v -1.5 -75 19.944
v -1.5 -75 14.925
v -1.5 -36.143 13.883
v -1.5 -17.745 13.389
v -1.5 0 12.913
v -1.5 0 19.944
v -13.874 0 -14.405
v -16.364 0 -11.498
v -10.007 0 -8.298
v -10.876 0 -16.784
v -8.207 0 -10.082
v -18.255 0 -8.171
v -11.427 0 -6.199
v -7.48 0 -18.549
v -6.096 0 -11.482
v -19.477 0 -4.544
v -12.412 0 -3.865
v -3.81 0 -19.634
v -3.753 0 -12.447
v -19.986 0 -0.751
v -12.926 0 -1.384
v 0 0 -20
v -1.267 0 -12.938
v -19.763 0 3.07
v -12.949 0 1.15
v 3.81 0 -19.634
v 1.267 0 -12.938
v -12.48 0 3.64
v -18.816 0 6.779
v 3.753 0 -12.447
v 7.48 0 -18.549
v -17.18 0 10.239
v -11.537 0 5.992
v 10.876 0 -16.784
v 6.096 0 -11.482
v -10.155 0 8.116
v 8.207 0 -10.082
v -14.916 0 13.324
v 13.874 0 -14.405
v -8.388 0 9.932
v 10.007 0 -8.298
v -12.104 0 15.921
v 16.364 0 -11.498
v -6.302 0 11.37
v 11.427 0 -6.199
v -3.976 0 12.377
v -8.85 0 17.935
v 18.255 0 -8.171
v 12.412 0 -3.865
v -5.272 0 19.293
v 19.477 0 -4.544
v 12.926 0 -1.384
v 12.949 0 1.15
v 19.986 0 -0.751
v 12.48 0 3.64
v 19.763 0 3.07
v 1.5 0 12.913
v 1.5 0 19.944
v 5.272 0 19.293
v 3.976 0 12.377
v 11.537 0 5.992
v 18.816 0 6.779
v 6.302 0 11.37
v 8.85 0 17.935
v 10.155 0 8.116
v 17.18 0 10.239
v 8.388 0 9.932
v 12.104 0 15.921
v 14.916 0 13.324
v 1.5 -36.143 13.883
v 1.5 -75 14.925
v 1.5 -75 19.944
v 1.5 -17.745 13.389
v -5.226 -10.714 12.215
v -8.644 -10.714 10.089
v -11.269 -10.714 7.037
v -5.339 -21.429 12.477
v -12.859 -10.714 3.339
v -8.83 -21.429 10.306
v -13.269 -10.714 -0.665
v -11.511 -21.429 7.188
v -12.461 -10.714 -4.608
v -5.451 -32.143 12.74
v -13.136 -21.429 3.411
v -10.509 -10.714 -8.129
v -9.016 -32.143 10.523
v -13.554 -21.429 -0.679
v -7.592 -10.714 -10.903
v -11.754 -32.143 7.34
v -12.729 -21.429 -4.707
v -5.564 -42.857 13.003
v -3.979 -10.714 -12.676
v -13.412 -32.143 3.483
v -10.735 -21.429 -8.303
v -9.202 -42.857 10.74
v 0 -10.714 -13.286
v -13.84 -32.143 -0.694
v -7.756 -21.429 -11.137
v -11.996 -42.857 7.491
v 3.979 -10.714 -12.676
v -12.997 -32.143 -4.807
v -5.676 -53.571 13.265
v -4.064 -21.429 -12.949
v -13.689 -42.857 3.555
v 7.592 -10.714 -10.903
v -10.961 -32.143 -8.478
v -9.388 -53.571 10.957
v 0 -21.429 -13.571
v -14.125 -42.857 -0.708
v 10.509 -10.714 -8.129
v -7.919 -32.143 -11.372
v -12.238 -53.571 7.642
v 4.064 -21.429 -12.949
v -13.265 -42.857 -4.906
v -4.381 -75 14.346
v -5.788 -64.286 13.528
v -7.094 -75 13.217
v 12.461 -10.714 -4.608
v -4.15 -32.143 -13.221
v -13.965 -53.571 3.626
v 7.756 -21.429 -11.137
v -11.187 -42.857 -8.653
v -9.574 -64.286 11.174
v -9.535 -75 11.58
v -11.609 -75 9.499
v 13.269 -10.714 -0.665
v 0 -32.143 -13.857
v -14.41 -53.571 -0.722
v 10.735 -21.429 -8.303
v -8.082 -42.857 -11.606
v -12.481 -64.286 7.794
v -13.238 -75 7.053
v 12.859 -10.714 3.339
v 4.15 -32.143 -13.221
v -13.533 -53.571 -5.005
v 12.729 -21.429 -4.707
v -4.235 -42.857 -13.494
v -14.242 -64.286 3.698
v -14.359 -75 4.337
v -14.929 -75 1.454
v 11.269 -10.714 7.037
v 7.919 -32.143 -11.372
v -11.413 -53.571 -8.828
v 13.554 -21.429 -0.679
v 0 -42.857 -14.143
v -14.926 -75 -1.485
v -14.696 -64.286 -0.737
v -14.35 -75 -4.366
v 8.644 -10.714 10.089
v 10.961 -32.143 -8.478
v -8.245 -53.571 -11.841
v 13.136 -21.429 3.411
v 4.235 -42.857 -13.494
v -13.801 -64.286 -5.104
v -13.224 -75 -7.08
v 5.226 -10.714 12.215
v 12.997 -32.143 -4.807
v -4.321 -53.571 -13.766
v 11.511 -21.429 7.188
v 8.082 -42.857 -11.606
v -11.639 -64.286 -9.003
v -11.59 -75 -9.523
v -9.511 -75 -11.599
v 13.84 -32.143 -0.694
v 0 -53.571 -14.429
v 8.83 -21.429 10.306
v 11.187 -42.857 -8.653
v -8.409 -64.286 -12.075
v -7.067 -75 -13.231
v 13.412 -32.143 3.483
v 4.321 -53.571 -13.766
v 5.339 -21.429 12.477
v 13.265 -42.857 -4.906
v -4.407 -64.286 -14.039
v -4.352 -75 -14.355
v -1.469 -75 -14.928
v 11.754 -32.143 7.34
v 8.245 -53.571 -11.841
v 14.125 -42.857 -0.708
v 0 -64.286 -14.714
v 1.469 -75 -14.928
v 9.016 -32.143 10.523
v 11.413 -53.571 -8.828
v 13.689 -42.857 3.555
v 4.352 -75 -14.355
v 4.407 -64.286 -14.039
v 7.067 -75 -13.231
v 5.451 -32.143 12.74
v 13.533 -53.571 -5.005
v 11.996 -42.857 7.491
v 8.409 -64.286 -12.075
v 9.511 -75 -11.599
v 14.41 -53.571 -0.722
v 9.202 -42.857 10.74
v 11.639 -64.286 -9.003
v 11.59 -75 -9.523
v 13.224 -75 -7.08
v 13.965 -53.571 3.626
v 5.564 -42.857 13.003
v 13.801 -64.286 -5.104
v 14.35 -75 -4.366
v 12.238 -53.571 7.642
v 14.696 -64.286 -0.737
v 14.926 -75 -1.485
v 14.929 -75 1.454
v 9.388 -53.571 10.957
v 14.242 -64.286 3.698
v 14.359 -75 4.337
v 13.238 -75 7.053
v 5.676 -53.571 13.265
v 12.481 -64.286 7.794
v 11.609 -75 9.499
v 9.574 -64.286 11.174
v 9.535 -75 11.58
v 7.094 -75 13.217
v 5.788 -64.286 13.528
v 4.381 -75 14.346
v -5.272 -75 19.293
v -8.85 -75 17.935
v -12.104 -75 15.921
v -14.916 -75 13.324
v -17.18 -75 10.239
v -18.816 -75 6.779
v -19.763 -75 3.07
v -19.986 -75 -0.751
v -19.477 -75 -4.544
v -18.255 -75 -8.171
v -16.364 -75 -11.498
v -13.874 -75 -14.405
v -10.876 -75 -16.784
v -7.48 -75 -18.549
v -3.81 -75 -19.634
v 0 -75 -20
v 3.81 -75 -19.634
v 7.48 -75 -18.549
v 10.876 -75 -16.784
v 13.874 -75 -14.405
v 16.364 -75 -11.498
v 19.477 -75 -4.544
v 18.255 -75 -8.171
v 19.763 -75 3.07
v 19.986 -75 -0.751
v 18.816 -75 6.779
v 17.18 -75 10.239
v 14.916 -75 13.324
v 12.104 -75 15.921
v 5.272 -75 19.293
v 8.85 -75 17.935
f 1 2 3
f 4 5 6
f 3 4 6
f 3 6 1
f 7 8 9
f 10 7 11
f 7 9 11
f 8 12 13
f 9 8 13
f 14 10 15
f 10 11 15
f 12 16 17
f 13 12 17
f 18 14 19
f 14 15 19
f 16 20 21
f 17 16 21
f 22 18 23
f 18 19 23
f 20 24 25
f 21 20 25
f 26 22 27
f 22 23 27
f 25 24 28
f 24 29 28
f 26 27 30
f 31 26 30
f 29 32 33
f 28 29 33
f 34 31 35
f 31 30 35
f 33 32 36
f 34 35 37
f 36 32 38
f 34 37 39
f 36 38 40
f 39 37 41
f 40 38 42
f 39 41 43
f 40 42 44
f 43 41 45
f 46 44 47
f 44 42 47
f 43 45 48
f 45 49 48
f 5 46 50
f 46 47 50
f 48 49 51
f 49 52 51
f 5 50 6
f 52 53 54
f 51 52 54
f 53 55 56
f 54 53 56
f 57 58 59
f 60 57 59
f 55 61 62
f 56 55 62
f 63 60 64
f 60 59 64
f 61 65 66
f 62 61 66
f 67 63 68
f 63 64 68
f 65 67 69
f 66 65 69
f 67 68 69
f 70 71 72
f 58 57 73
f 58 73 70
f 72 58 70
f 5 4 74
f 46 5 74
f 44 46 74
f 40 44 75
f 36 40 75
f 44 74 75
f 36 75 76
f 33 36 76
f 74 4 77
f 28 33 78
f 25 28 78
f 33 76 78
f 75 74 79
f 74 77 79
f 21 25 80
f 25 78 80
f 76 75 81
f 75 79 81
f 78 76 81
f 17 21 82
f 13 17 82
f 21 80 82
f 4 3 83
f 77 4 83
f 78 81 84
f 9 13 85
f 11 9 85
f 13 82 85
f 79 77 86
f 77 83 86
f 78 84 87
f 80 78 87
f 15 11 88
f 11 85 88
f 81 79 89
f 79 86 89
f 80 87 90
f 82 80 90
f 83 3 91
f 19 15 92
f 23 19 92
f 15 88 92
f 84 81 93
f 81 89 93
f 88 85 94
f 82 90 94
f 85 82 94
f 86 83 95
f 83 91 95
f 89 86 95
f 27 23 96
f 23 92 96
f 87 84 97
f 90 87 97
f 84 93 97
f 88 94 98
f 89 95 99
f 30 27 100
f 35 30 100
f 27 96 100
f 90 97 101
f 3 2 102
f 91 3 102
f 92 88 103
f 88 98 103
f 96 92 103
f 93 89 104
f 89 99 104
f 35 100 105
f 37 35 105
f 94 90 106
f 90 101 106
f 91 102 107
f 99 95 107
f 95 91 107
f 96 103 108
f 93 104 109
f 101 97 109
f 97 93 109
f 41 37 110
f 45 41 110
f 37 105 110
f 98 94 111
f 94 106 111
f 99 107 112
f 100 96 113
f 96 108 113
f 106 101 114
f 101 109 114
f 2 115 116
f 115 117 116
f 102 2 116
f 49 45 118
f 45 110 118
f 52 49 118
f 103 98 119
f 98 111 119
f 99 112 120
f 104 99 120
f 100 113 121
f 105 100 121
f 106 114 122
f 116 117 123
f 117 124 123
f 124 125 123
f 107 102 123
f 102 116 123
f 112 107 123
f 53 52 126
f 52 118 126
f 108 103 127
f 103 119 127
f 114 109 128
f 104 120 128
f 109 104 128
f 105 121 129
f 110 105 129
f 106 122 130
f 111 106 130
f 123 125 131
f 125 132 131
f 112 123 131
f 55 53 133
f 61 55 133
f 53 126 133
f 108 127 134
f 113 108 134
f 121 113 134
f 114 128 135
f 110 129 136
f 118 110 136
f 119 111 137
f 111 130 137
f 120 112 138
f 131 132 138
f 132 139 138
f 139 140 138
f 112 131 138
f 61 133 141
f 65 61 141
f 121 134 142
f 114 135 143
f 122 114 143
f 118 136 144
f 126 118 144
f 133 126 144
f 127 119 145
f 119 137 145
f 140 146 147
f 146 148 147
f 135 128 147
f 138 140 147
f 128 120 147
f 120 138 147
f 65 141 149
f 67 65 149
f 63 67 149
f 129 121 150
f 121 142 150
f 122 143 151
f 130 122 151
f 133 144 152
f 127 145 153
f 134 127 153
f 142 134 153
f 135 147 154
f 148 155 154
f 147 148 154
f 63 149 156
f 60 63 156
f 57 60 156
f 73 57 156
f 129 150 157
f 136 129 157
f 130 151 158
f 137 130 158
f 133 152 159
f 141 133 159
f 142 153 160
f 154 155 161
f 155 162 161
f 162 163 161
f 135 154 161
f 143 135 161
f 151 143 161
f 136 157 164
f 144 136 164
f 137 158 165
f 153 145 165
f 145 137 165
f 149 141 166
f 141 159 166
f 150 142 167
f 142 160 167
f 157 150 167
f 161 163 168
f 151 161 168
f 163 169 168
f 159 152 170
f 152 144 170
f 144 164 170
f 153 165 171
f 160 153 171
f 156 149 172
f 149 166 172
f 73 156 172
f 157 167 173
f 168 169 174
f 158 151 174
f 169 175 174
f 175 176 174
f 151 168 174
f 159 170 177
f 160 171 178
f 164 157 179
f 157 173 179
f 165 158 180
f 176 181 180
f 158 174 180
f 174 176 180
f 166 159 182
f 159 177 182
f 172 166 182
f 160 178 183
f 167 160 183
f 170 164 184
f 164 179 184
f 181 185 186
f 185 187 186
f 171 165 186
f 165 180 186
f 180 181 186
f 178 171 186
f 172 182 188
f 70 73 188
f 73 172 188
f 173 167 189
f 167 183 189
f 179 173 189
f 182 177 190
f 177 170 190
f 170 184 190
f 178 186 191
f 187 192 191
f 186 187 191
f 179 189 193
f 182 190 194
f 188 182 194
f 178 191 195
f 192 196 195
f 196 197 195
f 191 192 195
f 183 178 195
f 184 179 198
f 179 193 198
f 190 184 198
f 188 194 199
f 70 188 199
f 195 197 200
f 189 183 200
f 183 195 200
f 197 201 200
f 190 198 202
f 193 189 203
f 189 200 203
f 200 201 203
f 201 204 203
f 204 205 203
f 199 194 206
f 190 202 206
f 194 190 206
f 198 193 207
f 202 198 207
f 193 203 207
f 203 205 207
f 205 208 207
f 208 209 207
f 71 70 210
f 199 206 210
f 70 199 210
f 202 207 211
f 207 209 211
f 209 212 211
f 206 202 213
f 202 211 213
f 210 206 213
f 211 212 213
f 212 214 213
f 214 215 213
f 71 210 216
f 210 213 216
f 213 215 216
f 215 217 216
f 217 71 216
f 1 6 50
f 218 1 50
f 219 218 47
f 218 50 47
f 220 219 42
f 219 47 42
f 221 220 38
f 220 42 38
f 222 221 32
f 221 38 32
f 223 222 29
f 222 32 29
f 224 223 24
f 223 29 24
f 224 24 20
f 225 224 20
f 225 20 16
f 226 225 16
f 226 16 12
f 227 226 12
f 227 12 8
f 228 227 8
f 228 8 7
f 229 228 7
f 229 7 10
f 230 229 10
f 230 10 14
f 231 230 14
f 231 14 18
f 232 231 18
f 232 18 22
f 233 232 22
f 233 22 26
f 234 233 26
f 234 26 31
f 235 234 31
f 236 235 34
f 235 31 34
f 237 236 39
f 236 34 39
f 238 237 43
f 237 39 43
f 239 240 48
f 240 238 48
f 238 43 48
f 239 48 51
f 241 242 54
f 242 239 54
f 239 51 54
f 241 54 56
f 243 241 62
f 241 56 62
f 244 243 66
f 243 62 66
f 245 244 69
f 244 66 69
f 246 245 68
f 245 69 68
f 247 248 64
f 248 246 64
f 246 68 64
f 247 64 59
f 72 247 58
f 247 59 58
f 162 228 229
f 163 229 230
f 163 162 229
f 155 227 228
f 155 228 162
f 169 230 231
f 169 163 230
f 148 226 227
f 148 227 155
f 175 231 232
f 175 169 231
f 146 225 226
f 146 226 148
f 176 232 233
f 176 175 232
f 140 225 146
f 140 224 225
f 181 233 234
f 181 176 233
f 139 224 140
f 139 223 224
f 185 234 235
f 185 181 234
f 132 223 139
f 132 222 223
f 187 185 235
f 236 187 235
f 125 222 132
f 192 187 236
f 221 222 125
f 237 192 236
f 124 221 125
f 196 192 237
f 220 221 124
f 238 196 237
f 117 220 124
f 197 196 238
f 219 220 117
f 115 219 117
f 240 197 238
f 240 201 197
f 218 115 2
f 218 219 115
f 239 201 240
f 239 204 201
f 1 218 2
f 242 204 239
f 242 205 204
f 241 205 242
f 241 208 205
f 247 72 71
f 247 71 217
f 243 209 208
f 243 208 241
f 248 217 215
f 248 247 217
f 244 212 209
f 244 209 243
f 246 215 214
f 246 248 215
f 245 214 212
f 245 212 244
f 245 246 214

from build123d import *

# Parameters (mm, degrees)
F0_R     = 20
F0_R_2   = 13
F1_DEPTH = 75
F4_W     = 3
F4_H     = 9
F5_DEPTH = 75


with BuildPart() as f1:
    # F0 (on Front) → F1 (new body)
    with BuildSketch(Plane.XZ):
        Circle(F0_R)
        Circle(F0_R_2, mode=Mode.SUBTRACT)
    extrude(amount=F1_DEPTH)

    # F2 (on Right) → F3 (revolve, cut)
    with BuildSketch(Plane.YZ):
        Polygon((0, 13), (-75, 15), (-75, 13), align=None)
    revolve(axis=Axis((0, 0, 0), (0, -1, 0)), mode=Mode.SUBTRACT)

    # F4 (on face) → F5 (cut)
    with BuildSketch(Plane(origin=(0, 0, 0), x_dir=(-1, 0, 0), z_dir=(0, 1, 0))):
        with Locations((0, 16.5)):
            Rectangle(F4_W, F4_H)
    extrude(amount=-F5_DEPTH, mode=Mode.SUBTRACT)


solid = f1.part
